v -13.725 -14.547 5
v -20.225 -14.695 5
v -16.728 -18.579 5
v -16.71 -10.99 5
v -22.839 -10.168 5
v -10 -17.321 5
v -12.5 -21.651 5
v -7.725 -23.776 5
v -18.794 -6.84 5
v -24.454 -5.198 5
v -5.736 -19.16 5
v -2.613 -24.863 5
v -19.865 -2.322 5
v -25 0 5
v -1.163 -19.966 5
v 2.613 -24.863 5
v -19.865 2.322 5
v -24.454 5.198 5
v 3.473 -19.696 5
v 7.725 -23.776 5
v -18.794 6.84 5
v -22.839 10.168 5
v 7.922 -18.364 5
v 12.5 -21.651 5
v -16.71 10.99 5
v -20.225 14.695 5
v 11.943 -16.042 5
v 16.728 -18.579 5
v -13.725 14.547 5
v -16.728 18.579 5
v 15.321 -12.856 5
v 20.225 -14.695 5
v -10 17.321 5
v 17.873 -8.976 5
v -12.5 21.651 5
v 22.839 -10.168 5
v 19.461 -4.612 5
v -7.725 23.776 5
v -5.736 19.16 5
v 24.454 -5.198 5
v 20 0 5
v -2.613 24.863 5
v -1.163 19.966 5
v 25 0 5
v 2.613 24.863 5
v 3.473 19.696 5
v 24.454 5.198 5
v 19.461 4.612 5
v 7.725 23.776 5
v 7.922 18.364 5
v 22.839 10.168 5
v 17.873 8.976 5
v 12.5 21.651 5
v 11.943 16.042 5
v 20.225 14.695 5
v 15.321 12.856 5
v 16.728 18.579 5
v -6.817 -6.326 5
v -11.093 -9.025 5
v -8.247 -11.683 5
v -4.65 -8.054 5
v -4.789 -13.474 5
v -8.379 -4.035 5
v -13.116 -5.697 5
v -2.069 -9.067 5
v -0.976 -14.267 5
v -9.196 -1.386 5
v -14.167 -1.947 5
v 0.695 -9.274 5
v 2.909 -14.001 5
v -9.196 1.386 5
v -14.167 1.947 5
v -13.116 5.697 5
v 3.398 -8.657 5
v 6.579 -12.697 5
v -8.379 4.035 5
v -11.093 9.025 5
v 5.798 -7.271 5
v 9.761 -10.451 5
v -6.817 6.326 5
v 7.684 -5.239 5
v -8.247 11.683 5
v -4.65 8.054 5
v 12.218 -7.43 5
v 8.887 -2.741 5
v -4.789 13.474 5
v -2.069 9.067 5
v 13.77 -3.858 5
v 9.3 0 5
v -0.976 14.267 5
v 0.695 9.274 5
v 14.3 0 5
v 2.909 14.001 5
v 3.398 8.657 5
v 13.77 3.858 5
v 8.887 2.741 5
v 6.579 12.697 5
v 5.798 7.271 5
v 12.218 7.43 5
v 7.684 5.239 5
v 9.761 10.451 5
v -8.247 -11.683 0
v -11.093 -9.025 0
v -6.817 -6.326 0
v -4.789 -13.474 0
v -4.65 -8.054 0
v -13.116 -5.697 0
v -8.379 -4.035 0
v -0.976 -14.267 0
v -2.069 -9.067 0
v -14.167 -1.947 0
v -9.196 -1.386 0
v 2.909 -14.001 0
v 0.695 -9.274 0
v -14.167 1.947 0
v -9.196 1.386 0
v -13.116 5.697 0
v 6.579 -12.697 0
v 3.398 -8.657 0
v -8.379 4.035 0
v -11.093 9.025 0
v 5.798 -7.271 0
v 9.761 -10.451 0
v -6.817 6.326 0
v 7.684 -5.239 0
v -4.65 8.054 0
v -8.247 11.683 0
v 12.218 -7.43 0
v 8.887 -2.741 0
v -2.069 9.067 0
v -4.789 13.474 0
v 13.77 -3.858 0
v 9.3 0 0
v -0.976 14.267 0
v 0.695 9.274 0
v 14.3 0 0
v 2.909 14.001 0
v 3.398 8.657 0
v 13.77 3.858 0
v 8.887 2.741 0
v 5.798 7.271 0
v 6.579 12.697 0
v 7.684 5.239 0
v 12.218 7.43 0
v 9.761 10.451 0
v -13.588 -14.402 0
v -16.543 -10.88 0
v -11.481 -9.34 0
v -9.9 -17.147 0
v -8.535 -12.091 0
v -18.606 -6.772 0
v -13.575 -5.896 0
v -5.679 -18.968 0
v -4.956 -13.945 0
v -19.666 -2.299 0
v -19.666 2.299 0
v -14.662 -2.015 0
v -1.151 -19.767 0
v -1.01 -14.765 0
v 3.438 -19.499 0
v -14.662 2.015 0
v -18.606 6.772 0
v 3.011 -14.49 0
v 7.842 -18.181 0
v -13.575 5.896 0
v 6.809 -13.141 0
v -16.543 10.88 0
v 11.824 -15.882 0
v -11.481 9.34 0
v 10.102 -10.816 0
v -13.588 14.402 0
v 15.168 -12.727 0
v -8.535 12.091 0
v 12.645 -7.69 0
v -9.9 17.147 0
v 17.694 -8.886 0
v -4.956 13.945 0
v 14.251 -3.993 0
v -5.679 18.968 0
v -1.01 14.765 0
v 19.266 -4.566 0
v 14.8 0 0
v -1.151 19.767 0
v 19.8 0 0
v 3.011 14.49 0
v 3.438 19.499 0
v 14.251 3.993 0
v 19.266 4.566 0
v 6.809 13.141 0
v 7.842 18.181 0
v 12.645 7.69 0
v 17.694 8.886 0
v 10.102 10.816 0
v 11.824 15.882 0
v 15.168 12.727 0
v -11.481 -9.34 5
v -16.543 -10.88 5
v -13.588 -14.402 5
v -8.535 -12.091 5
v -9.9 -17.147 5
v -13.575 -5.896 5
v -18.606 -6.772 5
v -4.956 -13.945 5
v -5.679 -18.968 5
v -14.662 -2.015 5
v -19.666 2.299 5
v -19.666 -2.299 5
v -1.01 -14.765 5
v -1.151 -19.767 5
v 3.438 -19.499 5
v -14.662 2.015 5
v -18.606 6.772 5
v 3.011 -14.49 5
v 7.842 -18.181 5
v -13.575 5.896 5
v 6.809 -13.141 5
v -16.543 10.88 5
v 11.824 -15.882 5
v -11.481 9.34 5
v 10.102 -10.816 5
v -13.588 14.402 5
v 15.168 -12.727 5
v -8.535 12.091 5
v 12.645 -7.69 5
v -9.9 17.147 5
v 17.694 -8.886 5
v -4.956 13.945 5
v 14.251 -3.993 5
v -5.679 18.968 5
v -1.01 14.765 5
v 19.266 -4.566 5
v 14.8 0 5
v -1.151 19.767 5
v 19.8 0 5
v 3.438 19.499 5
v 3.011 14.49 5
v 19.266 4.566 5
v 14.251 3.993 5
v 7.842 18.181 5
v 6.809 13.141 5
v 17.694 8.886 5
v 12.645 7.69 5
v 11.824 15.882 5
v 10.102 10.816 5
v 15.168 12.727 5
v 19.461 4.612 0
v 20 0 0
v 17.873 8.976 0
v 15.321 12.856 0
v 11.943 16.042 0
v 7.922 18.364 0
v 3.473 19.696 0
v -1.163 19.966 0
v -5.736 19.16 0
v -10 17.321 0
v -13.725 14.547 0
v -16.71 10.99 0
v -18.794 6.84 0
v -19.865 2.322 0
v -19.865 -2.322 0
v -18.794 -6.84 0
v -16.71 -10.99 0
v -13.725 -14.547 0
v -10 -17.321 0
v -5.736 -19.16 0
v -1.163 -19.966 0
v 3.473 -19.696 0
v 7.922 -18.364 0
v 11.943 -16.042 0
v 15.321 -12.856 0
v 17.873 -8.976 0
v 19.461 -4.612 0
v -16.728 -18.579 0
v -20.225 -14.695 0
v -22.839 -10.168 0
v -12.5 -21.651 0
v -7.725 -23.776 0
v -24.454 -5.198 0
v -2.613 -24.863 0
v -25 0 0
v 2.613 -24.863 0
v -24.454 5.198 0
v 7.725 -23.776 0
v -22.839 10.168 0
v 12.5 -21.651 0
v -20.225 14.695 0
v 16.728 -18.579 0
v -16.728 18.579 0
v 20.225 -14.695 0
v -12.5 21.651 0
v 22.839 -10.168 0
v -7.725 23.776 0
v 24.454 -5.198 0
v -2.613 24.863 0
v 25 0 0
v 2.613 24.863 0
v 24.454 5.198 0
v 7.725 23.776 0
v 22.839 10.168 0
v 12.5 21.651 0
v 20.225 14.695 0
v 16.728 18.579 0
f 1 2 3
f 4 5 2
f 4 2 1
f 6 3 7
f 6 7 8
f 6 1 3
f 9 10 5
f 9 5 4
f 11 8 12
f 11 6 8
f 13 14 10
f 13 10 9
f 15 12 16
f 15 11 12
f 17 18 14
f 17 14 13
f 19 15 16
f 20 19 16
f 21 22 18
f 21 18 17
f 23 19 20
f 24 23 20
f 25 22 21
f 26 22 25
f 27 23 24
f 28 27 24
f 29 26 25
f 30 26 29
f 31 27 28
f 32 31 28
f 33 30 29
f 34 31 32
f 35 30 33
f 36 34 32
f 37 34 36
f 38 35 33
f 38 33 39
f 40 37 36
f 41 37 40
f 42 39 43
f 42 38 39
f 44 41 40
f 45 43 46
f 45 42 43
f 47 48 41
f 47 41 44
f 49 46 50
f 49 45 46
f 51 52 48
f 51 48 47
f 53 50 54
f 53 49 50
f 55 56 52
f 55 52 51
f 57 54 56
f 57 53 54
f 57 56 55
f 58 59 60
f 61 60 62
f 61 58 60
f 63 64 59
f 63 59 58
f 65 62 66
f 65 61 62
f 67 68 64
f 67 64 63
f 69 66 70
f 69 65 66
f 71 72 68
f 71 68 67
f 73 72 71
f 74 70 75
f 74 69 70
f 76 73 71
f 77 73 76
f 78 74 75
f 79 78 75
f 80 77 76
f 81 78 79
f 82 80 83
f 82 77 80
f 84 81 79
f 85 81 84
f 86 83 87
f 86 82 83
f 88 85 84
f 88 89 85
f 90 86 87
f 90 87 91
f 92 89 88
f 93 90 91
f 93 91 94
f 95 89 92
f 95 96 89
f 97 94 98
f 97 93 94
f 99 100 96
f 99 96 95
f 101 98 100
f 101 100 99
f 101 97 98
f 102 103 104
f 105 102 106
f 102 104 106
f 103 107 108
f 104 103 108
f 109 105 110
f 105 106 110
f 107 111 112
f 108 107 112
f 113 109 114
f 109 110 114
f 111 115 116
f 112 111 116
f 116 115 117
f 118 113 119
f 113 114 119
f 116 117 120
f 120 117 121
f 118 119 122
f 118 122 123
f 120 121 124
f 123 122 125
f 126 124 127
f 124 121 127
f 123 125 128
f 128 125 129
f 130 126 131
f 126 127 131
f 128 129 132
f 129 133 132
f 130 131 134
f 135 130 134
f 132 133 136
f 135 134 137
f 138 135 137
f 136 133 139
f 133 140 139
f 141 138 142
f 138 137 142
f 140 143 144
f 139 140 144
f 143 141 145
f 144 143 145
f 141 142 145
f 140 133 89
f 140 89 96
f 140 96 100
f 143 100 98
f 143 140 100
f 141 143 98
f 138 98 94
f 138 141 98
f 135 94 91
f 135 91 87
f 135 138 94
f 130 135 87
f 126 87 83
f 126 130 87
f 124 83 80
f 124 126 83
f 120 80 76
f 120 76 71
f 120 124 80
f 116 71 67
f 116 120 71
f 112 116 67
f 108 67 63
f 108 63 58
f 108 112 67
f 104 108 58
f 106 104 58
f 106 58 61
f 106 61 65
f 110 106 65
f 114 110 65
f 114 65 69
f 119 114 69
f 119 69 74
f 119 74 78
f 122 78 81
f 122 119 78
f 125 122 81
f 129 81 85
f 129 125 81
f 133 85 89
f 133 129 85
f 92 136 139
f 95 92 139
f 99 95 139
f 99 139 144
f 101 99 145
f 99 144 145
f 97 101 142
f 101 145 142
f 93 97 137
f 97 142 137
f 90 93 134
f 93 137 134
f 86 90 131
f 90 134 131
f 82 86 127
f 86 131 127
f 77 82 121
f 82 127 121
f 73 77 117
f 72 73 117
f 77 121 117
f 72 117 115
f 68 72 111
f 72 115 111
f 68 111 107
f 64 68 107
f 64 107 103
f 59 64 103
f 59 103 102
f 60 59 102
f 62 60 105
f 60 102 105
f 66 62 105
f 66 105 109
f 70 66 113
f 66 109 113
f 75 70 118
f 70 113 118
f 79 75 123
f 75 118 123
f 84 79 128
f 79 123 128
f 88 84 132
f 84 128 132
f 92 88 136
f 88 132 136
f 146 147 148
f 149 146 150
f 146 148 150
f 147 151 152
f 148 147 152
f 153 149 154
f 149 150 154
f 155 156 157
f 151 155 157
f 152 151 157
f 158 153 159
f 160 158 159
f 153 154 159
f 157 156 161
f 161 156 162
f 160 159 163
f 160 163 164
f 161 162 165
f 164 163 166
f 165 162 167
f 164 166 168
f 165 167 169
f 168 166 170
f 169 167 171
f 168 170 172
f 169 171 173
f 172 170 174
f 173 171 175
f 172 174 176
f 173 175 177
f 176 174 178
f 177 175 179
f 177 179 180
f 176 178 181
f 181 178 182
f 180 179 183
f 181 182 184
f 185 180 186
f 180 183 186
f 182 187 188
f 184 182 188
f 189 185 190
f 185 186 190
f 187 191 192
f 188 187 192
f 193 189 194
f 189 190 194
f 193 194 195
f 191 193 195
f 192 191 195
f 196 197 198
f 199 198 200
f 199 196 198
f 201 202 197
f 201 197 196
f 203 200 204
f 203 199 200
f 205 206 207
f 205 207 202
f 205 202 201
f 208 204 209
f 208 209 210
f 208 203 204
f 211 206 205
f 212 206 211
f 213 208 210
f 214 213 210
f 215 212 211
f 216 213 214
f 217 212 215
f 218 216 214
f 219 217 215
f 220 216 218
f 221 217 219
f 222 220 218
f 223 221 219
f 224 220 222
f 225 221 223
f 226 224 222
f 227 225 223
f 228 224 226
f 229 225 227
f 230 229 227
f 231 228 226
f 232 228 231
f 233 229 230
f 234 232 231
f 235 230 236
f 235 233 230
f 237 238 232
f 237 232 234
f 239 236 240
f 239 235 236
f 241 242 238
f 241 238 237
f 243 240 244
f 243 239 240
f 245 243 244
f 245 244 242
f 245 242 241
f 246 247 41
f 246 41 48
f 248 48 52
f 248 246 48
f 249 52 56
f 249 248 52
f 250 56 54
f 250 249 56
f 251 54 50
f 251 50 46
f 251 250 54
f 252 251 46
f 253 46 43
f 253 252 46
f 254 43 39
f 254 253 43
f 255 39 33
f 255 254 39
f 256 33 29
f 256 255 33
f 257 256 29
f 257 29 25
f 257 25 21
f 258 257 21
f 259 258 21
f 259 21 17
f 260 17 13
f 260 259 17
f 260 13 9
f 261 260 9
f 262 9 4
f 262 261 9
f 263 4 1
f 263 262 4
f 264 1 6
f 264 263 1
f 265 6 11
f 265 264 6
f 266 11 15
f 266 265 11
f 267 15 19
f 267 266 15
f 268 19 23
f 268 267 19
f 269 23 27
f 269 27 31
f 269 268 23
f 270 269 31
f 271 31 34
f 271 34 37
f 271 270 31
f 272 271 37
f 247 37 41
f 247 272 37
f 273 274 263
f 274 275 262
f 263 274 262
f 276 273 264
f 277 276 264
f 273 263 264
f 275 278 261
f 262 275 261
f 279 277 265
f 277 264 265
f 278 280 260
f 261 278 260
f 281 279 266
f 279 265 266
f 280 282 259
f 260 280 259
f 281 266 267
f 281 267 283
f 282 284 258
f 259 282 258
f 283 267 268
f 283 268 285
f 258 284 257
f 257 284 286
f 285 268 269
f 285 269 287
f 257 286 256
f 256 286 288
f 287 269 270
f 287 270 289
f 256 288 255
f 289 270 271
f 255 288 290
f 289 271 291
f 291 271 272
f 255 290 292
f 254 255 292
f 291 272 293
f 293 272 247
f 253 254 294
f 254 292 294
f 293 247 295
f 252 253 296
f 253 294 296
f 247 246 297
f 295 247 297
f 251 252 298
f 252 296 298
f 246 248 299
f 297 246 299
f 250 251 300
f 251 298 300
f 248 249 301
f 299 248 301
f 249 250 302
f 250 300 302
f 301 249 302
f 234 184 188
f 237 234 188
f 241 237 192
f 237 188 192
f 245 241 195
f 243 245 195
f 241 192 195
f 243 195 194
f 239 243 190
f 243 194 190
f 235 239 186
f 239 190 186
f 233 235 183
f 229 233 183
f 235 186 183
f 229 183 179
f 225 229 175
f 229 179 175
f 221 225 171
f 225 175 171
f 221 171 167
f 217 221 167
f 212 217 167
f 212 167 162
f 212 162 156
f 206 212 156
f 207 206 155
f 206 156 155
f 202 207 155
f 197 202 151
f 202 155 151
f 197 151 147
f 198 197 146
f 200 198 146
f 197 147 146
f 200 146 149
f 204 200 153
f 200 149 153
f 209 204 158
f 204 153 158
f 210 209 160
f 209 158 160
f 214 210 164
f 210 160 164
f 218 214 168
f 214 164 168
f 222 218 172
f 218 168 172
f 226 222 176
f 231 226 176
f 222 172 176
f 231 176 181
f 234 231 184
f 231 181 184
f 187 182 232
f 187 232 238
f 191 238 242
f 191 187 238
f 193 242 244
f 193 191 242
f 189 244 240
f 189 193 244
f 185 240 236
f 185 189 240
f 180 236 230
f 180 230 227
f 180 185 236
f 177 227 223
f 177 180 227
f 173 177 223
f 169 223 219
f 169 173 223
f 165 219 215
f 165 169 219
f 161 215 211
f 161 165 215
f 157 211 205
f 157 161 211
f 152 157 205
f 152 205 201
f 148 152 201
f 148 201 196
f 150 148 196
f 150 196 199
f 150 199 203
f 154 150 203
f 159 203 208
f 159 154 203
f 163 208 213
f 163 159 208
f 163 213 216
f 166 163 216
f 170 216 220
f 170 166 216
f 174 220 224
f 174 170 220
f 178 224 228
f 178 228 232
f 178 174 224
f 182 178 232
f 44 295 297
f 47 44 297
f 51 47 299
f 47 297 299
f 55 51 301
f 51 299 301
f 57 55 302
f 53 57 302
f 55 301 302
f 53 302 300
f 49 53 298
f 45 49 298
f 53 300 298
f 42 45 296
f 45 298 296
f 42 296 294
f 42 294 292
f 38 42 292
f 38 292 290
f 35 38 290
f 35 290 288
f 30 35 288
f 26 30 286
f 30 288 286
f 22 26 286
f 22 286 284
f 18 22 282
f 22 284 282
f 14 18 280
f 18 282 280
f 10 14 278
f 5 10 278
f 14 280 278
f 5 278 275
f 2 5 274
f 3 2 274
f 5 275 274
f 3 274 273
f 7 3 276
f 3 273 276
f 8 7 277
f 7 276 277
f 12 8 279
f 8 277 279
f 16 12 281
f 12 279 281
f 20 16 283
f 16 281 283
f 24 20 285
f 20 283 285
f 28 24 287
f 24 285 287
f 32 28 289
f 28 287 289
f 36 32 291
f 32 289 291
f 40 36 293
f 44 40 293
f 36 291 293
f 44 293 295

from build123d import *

# Parameters (mm, degrees)
F0_R     = 25
F0_R_2   = 20
F0_R_3   = 19.8
F0_R_4   = 14.8
F0_R_5   = 14.3
F0_R_6   = 9.3
F1_DEPTH = 5


with BuildPart() as f1:
    # F0 (on Top) → F1 (new body)
    with BuildSketch(Plane.XY):
        Circle(F0_R)
        Circle(F0_R_2, mode=Mode.SUBTRACT)
        Circle(F0_R_3)
        Circle(F0_R_4, mode=Mode.SUBTRACT)
        Circle(F0_R_5)
        Circle(F0_R_6, mode=Mode.SUBTRACT)
    extrude(amount=F1_DEPTH)


solid = f1.part
